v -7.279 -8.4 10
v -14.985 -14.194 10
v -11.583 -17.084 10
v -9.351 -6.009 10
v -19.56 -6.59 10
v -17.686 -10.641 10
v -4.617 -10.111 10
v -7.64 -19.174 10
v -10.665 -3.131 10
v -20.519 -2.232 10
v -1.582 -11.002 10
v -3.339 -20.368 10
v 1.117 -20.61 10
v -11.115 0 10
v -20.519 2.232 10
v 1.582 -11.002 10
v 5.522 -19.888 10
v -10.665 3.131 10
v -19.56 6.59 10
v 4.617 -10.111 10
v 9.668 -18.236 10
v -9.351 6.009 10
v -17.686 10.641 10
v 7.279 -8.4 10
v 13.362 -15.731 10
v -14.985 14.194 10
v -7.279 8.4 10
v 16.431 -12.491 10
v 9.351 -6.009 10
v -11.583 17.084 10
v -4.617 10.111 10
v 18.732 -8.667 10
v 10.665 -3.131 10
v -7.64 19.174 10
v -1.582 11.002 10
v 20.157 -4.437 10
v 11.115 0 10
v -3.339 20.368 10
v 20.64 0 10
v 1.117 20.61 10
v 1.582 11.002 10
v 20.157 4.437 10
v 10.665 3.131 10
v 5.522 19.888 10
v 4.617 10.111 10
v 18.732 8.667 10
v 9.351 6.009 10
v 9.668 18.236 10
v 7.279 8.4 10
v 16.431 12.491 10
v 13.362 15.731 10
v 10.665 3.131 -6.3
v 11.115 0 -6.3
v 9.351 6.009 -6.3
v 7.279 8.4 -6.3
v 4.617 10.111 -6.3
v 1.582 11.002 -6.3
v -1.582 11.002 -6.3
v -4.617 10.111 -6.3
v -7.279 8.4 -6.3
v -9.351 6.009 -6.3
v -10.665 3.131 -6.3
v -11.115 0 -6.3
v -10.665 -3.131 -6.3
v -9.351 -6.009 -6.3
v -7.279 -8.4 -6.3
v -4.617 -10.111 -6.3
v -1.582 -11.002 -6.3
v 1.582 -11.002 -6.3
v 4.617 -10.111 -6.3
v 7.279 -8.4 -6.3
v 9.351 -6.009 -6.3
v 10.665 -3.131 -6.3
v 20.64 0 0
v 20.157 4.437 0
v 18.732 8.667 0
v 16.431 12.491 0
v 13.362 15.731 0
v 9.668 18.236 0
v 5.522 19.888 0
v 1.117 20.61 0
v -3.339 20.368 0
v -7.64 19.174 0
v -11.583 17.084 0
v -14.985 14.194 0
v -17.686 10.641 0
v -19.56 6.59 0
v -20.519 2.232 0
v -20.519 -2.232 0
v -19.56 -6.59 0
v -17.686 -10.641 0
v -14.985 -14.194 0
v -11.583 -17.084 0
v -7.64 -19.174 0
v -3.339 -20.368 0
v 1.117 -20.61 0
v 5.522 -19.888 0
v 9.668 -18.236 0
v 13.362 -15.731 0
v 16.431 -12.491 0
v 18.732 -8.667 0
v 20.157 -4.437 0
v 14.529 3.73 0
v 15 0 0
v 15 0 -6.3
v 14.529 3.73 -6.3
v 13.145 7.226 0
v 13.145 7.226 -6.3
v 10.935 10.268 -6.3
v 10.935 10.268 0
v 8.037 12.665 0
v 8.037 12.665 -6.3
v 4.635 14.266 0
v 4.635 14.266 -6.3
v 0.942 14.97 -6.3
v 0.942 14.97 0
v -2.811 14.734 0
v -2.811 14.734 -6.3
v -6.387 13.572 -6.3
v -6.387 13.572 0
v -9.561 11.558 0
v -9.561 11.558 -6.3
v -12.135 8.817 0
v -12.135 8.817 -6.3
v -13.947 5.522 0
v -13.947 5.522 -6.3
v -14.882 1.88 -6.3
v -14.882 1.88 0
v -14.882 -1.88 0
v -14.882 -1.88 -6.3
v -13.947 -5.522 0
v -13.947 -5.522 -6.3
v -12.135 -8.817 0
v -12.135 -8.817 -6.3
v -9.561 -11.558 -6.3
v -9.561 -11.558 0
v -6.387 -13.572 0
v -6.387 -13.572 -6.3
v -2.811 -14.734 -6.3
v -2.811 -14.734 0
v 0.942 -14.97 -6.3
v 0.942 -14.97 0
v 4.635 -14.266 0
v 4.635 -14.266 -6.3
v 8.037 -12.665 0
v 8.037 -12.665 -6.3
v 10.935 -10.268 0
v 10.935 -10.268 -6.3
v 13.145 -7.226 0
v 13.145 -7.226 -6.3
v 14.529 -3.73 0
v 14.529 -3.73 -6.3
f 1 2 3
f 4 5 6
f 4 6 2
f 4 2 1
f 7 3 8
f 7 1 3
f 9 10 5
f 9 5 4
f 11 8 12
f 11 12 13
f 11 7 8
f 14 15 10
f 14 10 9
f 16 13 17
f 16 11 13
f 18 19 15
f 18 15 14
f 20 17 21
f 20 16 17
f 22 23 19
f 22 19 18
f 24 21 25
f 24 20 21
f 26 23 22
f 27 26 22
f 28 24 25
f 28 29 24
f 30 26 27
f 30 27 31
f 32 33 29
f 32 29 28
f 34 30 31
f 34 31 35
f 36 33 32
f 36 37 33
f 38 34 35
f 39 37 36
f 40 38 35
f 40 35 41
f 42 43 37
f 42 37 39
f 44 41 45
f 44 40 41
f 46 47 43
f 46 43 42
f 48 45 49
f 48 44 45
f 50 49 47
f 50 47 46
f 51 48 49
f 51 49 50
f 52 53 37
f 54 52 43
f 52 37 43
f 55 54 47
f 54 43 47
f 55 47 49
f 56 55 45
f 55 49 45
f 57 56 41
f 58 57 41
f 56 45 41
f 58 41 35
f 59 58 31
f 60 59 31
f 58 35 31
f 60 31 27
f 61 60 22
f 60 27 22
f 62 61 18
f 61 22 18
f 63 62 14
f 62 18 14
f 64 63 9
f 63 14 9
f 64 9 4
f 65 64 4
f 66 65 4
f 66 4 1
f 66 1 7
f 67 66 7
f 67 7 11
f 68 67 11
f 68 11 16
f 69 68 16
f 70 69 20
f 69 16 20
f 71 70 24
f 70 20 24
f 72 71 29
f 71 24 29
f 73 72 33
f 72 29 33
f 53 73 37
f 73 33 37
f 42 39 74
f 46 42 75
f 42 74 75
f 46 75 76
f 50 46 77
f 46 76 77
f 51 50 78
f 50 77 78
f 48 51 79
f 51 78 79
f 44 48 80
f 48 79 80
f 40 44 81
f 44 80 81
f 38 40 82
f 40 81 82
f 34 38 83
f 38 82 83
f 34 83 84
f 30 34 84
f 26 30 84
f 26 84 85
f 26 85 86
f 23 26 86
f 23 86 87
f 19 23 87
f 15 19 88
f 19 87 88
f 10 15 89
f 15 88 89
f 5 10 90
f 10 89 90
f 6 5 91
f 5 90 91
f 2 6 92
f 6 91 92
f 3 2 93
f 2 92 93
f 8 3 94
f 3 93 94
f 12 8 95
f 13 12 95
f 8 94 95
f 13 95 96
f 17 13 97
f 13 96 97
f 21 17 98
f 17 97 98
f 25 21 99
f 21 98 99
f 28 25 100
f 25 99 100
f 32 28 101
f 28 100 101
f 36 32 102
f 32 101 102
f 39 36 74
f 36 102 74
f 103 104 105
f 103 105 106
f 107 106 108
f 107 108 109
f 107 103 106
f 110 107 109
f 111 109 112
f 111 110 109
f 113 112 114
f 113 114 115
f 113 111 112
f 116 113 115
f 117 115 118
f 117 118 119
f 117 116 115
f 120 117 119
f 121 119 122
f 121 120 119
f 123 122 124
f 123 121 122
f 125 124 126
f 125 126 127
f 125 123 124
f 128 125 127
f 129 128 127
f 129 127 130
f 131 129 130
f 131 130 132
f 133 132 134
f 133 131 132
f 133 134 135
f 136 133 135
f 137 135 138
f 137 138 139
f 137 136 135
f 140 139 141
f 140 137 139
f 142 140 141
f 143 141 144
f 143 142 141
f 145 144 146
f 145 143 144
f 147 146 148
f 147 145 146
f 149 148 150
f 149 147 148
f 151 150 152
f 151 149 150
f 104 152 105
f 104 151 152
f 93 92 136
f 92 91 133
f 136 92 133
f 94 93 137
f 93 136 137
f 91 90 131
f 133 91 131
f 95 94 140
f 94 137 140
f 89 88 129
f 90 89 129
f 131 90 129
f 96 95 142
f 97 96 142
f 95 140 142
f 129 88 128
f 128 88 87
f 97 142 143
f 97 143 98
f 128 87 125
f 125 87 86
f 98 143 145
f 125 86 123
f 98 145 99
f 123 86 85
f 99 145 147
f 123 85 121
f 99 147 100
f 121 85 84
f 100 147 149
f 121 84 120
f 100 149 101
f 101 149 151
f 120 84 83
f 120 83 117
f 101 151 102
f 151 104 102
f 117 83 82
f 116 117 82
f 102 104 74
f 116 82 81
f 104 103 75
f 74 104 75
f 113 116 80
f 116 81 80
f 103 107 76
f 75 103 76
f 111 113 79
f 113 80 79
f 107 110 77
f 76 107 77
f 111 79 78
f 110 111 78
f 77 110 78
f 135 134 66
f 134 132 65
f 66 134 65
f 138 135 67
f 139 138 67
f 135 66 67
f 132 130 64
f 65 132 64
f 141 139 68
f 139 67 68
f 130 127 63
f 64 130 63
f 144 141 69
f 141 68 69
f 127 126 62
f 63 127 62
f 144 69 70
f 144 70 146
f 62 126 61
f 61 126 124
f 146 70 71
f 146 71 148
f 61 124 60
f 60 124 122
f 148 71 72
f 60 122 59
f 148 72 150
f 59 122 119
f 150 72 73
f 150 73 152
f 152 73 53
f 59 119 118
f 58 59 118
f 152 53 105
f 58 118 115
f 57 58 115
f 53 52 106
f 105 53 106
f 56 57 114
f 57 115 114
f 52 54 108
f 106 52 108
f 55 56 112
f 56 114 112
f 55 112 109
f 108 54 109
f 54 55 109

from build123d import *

# Parameters (mm, degrees)
F0_R     = 20.64
F1_DEPTH = 10
F2_R     = 15
F3_DEPTH = 6.3
F4_R     = 11.115
F5_DEPTH = 12.5


with BuildPart() as f1:
    # F0 (on Top) → F1 (new body)
    with BuildSketch(Plane.XY):
        Circle(F0_R)
    extrude(amount=F1_DEPTH)

    # F2 (on Top) → F3 (join, symmetric)
    with BuildSketch(Plane.XY):
        Circle(F2_R)
    extrude(amount=F3_DEPTH, both=True)

    # F4 (on Top) → F5 (cut, symmetric)
    with BuildSketch(Plane.XY):
        Circle(F4_R)
    extrude(amount=F5_DEPTH, both=True, mode=Mode.SUBTRACT)


solid = f1.part
